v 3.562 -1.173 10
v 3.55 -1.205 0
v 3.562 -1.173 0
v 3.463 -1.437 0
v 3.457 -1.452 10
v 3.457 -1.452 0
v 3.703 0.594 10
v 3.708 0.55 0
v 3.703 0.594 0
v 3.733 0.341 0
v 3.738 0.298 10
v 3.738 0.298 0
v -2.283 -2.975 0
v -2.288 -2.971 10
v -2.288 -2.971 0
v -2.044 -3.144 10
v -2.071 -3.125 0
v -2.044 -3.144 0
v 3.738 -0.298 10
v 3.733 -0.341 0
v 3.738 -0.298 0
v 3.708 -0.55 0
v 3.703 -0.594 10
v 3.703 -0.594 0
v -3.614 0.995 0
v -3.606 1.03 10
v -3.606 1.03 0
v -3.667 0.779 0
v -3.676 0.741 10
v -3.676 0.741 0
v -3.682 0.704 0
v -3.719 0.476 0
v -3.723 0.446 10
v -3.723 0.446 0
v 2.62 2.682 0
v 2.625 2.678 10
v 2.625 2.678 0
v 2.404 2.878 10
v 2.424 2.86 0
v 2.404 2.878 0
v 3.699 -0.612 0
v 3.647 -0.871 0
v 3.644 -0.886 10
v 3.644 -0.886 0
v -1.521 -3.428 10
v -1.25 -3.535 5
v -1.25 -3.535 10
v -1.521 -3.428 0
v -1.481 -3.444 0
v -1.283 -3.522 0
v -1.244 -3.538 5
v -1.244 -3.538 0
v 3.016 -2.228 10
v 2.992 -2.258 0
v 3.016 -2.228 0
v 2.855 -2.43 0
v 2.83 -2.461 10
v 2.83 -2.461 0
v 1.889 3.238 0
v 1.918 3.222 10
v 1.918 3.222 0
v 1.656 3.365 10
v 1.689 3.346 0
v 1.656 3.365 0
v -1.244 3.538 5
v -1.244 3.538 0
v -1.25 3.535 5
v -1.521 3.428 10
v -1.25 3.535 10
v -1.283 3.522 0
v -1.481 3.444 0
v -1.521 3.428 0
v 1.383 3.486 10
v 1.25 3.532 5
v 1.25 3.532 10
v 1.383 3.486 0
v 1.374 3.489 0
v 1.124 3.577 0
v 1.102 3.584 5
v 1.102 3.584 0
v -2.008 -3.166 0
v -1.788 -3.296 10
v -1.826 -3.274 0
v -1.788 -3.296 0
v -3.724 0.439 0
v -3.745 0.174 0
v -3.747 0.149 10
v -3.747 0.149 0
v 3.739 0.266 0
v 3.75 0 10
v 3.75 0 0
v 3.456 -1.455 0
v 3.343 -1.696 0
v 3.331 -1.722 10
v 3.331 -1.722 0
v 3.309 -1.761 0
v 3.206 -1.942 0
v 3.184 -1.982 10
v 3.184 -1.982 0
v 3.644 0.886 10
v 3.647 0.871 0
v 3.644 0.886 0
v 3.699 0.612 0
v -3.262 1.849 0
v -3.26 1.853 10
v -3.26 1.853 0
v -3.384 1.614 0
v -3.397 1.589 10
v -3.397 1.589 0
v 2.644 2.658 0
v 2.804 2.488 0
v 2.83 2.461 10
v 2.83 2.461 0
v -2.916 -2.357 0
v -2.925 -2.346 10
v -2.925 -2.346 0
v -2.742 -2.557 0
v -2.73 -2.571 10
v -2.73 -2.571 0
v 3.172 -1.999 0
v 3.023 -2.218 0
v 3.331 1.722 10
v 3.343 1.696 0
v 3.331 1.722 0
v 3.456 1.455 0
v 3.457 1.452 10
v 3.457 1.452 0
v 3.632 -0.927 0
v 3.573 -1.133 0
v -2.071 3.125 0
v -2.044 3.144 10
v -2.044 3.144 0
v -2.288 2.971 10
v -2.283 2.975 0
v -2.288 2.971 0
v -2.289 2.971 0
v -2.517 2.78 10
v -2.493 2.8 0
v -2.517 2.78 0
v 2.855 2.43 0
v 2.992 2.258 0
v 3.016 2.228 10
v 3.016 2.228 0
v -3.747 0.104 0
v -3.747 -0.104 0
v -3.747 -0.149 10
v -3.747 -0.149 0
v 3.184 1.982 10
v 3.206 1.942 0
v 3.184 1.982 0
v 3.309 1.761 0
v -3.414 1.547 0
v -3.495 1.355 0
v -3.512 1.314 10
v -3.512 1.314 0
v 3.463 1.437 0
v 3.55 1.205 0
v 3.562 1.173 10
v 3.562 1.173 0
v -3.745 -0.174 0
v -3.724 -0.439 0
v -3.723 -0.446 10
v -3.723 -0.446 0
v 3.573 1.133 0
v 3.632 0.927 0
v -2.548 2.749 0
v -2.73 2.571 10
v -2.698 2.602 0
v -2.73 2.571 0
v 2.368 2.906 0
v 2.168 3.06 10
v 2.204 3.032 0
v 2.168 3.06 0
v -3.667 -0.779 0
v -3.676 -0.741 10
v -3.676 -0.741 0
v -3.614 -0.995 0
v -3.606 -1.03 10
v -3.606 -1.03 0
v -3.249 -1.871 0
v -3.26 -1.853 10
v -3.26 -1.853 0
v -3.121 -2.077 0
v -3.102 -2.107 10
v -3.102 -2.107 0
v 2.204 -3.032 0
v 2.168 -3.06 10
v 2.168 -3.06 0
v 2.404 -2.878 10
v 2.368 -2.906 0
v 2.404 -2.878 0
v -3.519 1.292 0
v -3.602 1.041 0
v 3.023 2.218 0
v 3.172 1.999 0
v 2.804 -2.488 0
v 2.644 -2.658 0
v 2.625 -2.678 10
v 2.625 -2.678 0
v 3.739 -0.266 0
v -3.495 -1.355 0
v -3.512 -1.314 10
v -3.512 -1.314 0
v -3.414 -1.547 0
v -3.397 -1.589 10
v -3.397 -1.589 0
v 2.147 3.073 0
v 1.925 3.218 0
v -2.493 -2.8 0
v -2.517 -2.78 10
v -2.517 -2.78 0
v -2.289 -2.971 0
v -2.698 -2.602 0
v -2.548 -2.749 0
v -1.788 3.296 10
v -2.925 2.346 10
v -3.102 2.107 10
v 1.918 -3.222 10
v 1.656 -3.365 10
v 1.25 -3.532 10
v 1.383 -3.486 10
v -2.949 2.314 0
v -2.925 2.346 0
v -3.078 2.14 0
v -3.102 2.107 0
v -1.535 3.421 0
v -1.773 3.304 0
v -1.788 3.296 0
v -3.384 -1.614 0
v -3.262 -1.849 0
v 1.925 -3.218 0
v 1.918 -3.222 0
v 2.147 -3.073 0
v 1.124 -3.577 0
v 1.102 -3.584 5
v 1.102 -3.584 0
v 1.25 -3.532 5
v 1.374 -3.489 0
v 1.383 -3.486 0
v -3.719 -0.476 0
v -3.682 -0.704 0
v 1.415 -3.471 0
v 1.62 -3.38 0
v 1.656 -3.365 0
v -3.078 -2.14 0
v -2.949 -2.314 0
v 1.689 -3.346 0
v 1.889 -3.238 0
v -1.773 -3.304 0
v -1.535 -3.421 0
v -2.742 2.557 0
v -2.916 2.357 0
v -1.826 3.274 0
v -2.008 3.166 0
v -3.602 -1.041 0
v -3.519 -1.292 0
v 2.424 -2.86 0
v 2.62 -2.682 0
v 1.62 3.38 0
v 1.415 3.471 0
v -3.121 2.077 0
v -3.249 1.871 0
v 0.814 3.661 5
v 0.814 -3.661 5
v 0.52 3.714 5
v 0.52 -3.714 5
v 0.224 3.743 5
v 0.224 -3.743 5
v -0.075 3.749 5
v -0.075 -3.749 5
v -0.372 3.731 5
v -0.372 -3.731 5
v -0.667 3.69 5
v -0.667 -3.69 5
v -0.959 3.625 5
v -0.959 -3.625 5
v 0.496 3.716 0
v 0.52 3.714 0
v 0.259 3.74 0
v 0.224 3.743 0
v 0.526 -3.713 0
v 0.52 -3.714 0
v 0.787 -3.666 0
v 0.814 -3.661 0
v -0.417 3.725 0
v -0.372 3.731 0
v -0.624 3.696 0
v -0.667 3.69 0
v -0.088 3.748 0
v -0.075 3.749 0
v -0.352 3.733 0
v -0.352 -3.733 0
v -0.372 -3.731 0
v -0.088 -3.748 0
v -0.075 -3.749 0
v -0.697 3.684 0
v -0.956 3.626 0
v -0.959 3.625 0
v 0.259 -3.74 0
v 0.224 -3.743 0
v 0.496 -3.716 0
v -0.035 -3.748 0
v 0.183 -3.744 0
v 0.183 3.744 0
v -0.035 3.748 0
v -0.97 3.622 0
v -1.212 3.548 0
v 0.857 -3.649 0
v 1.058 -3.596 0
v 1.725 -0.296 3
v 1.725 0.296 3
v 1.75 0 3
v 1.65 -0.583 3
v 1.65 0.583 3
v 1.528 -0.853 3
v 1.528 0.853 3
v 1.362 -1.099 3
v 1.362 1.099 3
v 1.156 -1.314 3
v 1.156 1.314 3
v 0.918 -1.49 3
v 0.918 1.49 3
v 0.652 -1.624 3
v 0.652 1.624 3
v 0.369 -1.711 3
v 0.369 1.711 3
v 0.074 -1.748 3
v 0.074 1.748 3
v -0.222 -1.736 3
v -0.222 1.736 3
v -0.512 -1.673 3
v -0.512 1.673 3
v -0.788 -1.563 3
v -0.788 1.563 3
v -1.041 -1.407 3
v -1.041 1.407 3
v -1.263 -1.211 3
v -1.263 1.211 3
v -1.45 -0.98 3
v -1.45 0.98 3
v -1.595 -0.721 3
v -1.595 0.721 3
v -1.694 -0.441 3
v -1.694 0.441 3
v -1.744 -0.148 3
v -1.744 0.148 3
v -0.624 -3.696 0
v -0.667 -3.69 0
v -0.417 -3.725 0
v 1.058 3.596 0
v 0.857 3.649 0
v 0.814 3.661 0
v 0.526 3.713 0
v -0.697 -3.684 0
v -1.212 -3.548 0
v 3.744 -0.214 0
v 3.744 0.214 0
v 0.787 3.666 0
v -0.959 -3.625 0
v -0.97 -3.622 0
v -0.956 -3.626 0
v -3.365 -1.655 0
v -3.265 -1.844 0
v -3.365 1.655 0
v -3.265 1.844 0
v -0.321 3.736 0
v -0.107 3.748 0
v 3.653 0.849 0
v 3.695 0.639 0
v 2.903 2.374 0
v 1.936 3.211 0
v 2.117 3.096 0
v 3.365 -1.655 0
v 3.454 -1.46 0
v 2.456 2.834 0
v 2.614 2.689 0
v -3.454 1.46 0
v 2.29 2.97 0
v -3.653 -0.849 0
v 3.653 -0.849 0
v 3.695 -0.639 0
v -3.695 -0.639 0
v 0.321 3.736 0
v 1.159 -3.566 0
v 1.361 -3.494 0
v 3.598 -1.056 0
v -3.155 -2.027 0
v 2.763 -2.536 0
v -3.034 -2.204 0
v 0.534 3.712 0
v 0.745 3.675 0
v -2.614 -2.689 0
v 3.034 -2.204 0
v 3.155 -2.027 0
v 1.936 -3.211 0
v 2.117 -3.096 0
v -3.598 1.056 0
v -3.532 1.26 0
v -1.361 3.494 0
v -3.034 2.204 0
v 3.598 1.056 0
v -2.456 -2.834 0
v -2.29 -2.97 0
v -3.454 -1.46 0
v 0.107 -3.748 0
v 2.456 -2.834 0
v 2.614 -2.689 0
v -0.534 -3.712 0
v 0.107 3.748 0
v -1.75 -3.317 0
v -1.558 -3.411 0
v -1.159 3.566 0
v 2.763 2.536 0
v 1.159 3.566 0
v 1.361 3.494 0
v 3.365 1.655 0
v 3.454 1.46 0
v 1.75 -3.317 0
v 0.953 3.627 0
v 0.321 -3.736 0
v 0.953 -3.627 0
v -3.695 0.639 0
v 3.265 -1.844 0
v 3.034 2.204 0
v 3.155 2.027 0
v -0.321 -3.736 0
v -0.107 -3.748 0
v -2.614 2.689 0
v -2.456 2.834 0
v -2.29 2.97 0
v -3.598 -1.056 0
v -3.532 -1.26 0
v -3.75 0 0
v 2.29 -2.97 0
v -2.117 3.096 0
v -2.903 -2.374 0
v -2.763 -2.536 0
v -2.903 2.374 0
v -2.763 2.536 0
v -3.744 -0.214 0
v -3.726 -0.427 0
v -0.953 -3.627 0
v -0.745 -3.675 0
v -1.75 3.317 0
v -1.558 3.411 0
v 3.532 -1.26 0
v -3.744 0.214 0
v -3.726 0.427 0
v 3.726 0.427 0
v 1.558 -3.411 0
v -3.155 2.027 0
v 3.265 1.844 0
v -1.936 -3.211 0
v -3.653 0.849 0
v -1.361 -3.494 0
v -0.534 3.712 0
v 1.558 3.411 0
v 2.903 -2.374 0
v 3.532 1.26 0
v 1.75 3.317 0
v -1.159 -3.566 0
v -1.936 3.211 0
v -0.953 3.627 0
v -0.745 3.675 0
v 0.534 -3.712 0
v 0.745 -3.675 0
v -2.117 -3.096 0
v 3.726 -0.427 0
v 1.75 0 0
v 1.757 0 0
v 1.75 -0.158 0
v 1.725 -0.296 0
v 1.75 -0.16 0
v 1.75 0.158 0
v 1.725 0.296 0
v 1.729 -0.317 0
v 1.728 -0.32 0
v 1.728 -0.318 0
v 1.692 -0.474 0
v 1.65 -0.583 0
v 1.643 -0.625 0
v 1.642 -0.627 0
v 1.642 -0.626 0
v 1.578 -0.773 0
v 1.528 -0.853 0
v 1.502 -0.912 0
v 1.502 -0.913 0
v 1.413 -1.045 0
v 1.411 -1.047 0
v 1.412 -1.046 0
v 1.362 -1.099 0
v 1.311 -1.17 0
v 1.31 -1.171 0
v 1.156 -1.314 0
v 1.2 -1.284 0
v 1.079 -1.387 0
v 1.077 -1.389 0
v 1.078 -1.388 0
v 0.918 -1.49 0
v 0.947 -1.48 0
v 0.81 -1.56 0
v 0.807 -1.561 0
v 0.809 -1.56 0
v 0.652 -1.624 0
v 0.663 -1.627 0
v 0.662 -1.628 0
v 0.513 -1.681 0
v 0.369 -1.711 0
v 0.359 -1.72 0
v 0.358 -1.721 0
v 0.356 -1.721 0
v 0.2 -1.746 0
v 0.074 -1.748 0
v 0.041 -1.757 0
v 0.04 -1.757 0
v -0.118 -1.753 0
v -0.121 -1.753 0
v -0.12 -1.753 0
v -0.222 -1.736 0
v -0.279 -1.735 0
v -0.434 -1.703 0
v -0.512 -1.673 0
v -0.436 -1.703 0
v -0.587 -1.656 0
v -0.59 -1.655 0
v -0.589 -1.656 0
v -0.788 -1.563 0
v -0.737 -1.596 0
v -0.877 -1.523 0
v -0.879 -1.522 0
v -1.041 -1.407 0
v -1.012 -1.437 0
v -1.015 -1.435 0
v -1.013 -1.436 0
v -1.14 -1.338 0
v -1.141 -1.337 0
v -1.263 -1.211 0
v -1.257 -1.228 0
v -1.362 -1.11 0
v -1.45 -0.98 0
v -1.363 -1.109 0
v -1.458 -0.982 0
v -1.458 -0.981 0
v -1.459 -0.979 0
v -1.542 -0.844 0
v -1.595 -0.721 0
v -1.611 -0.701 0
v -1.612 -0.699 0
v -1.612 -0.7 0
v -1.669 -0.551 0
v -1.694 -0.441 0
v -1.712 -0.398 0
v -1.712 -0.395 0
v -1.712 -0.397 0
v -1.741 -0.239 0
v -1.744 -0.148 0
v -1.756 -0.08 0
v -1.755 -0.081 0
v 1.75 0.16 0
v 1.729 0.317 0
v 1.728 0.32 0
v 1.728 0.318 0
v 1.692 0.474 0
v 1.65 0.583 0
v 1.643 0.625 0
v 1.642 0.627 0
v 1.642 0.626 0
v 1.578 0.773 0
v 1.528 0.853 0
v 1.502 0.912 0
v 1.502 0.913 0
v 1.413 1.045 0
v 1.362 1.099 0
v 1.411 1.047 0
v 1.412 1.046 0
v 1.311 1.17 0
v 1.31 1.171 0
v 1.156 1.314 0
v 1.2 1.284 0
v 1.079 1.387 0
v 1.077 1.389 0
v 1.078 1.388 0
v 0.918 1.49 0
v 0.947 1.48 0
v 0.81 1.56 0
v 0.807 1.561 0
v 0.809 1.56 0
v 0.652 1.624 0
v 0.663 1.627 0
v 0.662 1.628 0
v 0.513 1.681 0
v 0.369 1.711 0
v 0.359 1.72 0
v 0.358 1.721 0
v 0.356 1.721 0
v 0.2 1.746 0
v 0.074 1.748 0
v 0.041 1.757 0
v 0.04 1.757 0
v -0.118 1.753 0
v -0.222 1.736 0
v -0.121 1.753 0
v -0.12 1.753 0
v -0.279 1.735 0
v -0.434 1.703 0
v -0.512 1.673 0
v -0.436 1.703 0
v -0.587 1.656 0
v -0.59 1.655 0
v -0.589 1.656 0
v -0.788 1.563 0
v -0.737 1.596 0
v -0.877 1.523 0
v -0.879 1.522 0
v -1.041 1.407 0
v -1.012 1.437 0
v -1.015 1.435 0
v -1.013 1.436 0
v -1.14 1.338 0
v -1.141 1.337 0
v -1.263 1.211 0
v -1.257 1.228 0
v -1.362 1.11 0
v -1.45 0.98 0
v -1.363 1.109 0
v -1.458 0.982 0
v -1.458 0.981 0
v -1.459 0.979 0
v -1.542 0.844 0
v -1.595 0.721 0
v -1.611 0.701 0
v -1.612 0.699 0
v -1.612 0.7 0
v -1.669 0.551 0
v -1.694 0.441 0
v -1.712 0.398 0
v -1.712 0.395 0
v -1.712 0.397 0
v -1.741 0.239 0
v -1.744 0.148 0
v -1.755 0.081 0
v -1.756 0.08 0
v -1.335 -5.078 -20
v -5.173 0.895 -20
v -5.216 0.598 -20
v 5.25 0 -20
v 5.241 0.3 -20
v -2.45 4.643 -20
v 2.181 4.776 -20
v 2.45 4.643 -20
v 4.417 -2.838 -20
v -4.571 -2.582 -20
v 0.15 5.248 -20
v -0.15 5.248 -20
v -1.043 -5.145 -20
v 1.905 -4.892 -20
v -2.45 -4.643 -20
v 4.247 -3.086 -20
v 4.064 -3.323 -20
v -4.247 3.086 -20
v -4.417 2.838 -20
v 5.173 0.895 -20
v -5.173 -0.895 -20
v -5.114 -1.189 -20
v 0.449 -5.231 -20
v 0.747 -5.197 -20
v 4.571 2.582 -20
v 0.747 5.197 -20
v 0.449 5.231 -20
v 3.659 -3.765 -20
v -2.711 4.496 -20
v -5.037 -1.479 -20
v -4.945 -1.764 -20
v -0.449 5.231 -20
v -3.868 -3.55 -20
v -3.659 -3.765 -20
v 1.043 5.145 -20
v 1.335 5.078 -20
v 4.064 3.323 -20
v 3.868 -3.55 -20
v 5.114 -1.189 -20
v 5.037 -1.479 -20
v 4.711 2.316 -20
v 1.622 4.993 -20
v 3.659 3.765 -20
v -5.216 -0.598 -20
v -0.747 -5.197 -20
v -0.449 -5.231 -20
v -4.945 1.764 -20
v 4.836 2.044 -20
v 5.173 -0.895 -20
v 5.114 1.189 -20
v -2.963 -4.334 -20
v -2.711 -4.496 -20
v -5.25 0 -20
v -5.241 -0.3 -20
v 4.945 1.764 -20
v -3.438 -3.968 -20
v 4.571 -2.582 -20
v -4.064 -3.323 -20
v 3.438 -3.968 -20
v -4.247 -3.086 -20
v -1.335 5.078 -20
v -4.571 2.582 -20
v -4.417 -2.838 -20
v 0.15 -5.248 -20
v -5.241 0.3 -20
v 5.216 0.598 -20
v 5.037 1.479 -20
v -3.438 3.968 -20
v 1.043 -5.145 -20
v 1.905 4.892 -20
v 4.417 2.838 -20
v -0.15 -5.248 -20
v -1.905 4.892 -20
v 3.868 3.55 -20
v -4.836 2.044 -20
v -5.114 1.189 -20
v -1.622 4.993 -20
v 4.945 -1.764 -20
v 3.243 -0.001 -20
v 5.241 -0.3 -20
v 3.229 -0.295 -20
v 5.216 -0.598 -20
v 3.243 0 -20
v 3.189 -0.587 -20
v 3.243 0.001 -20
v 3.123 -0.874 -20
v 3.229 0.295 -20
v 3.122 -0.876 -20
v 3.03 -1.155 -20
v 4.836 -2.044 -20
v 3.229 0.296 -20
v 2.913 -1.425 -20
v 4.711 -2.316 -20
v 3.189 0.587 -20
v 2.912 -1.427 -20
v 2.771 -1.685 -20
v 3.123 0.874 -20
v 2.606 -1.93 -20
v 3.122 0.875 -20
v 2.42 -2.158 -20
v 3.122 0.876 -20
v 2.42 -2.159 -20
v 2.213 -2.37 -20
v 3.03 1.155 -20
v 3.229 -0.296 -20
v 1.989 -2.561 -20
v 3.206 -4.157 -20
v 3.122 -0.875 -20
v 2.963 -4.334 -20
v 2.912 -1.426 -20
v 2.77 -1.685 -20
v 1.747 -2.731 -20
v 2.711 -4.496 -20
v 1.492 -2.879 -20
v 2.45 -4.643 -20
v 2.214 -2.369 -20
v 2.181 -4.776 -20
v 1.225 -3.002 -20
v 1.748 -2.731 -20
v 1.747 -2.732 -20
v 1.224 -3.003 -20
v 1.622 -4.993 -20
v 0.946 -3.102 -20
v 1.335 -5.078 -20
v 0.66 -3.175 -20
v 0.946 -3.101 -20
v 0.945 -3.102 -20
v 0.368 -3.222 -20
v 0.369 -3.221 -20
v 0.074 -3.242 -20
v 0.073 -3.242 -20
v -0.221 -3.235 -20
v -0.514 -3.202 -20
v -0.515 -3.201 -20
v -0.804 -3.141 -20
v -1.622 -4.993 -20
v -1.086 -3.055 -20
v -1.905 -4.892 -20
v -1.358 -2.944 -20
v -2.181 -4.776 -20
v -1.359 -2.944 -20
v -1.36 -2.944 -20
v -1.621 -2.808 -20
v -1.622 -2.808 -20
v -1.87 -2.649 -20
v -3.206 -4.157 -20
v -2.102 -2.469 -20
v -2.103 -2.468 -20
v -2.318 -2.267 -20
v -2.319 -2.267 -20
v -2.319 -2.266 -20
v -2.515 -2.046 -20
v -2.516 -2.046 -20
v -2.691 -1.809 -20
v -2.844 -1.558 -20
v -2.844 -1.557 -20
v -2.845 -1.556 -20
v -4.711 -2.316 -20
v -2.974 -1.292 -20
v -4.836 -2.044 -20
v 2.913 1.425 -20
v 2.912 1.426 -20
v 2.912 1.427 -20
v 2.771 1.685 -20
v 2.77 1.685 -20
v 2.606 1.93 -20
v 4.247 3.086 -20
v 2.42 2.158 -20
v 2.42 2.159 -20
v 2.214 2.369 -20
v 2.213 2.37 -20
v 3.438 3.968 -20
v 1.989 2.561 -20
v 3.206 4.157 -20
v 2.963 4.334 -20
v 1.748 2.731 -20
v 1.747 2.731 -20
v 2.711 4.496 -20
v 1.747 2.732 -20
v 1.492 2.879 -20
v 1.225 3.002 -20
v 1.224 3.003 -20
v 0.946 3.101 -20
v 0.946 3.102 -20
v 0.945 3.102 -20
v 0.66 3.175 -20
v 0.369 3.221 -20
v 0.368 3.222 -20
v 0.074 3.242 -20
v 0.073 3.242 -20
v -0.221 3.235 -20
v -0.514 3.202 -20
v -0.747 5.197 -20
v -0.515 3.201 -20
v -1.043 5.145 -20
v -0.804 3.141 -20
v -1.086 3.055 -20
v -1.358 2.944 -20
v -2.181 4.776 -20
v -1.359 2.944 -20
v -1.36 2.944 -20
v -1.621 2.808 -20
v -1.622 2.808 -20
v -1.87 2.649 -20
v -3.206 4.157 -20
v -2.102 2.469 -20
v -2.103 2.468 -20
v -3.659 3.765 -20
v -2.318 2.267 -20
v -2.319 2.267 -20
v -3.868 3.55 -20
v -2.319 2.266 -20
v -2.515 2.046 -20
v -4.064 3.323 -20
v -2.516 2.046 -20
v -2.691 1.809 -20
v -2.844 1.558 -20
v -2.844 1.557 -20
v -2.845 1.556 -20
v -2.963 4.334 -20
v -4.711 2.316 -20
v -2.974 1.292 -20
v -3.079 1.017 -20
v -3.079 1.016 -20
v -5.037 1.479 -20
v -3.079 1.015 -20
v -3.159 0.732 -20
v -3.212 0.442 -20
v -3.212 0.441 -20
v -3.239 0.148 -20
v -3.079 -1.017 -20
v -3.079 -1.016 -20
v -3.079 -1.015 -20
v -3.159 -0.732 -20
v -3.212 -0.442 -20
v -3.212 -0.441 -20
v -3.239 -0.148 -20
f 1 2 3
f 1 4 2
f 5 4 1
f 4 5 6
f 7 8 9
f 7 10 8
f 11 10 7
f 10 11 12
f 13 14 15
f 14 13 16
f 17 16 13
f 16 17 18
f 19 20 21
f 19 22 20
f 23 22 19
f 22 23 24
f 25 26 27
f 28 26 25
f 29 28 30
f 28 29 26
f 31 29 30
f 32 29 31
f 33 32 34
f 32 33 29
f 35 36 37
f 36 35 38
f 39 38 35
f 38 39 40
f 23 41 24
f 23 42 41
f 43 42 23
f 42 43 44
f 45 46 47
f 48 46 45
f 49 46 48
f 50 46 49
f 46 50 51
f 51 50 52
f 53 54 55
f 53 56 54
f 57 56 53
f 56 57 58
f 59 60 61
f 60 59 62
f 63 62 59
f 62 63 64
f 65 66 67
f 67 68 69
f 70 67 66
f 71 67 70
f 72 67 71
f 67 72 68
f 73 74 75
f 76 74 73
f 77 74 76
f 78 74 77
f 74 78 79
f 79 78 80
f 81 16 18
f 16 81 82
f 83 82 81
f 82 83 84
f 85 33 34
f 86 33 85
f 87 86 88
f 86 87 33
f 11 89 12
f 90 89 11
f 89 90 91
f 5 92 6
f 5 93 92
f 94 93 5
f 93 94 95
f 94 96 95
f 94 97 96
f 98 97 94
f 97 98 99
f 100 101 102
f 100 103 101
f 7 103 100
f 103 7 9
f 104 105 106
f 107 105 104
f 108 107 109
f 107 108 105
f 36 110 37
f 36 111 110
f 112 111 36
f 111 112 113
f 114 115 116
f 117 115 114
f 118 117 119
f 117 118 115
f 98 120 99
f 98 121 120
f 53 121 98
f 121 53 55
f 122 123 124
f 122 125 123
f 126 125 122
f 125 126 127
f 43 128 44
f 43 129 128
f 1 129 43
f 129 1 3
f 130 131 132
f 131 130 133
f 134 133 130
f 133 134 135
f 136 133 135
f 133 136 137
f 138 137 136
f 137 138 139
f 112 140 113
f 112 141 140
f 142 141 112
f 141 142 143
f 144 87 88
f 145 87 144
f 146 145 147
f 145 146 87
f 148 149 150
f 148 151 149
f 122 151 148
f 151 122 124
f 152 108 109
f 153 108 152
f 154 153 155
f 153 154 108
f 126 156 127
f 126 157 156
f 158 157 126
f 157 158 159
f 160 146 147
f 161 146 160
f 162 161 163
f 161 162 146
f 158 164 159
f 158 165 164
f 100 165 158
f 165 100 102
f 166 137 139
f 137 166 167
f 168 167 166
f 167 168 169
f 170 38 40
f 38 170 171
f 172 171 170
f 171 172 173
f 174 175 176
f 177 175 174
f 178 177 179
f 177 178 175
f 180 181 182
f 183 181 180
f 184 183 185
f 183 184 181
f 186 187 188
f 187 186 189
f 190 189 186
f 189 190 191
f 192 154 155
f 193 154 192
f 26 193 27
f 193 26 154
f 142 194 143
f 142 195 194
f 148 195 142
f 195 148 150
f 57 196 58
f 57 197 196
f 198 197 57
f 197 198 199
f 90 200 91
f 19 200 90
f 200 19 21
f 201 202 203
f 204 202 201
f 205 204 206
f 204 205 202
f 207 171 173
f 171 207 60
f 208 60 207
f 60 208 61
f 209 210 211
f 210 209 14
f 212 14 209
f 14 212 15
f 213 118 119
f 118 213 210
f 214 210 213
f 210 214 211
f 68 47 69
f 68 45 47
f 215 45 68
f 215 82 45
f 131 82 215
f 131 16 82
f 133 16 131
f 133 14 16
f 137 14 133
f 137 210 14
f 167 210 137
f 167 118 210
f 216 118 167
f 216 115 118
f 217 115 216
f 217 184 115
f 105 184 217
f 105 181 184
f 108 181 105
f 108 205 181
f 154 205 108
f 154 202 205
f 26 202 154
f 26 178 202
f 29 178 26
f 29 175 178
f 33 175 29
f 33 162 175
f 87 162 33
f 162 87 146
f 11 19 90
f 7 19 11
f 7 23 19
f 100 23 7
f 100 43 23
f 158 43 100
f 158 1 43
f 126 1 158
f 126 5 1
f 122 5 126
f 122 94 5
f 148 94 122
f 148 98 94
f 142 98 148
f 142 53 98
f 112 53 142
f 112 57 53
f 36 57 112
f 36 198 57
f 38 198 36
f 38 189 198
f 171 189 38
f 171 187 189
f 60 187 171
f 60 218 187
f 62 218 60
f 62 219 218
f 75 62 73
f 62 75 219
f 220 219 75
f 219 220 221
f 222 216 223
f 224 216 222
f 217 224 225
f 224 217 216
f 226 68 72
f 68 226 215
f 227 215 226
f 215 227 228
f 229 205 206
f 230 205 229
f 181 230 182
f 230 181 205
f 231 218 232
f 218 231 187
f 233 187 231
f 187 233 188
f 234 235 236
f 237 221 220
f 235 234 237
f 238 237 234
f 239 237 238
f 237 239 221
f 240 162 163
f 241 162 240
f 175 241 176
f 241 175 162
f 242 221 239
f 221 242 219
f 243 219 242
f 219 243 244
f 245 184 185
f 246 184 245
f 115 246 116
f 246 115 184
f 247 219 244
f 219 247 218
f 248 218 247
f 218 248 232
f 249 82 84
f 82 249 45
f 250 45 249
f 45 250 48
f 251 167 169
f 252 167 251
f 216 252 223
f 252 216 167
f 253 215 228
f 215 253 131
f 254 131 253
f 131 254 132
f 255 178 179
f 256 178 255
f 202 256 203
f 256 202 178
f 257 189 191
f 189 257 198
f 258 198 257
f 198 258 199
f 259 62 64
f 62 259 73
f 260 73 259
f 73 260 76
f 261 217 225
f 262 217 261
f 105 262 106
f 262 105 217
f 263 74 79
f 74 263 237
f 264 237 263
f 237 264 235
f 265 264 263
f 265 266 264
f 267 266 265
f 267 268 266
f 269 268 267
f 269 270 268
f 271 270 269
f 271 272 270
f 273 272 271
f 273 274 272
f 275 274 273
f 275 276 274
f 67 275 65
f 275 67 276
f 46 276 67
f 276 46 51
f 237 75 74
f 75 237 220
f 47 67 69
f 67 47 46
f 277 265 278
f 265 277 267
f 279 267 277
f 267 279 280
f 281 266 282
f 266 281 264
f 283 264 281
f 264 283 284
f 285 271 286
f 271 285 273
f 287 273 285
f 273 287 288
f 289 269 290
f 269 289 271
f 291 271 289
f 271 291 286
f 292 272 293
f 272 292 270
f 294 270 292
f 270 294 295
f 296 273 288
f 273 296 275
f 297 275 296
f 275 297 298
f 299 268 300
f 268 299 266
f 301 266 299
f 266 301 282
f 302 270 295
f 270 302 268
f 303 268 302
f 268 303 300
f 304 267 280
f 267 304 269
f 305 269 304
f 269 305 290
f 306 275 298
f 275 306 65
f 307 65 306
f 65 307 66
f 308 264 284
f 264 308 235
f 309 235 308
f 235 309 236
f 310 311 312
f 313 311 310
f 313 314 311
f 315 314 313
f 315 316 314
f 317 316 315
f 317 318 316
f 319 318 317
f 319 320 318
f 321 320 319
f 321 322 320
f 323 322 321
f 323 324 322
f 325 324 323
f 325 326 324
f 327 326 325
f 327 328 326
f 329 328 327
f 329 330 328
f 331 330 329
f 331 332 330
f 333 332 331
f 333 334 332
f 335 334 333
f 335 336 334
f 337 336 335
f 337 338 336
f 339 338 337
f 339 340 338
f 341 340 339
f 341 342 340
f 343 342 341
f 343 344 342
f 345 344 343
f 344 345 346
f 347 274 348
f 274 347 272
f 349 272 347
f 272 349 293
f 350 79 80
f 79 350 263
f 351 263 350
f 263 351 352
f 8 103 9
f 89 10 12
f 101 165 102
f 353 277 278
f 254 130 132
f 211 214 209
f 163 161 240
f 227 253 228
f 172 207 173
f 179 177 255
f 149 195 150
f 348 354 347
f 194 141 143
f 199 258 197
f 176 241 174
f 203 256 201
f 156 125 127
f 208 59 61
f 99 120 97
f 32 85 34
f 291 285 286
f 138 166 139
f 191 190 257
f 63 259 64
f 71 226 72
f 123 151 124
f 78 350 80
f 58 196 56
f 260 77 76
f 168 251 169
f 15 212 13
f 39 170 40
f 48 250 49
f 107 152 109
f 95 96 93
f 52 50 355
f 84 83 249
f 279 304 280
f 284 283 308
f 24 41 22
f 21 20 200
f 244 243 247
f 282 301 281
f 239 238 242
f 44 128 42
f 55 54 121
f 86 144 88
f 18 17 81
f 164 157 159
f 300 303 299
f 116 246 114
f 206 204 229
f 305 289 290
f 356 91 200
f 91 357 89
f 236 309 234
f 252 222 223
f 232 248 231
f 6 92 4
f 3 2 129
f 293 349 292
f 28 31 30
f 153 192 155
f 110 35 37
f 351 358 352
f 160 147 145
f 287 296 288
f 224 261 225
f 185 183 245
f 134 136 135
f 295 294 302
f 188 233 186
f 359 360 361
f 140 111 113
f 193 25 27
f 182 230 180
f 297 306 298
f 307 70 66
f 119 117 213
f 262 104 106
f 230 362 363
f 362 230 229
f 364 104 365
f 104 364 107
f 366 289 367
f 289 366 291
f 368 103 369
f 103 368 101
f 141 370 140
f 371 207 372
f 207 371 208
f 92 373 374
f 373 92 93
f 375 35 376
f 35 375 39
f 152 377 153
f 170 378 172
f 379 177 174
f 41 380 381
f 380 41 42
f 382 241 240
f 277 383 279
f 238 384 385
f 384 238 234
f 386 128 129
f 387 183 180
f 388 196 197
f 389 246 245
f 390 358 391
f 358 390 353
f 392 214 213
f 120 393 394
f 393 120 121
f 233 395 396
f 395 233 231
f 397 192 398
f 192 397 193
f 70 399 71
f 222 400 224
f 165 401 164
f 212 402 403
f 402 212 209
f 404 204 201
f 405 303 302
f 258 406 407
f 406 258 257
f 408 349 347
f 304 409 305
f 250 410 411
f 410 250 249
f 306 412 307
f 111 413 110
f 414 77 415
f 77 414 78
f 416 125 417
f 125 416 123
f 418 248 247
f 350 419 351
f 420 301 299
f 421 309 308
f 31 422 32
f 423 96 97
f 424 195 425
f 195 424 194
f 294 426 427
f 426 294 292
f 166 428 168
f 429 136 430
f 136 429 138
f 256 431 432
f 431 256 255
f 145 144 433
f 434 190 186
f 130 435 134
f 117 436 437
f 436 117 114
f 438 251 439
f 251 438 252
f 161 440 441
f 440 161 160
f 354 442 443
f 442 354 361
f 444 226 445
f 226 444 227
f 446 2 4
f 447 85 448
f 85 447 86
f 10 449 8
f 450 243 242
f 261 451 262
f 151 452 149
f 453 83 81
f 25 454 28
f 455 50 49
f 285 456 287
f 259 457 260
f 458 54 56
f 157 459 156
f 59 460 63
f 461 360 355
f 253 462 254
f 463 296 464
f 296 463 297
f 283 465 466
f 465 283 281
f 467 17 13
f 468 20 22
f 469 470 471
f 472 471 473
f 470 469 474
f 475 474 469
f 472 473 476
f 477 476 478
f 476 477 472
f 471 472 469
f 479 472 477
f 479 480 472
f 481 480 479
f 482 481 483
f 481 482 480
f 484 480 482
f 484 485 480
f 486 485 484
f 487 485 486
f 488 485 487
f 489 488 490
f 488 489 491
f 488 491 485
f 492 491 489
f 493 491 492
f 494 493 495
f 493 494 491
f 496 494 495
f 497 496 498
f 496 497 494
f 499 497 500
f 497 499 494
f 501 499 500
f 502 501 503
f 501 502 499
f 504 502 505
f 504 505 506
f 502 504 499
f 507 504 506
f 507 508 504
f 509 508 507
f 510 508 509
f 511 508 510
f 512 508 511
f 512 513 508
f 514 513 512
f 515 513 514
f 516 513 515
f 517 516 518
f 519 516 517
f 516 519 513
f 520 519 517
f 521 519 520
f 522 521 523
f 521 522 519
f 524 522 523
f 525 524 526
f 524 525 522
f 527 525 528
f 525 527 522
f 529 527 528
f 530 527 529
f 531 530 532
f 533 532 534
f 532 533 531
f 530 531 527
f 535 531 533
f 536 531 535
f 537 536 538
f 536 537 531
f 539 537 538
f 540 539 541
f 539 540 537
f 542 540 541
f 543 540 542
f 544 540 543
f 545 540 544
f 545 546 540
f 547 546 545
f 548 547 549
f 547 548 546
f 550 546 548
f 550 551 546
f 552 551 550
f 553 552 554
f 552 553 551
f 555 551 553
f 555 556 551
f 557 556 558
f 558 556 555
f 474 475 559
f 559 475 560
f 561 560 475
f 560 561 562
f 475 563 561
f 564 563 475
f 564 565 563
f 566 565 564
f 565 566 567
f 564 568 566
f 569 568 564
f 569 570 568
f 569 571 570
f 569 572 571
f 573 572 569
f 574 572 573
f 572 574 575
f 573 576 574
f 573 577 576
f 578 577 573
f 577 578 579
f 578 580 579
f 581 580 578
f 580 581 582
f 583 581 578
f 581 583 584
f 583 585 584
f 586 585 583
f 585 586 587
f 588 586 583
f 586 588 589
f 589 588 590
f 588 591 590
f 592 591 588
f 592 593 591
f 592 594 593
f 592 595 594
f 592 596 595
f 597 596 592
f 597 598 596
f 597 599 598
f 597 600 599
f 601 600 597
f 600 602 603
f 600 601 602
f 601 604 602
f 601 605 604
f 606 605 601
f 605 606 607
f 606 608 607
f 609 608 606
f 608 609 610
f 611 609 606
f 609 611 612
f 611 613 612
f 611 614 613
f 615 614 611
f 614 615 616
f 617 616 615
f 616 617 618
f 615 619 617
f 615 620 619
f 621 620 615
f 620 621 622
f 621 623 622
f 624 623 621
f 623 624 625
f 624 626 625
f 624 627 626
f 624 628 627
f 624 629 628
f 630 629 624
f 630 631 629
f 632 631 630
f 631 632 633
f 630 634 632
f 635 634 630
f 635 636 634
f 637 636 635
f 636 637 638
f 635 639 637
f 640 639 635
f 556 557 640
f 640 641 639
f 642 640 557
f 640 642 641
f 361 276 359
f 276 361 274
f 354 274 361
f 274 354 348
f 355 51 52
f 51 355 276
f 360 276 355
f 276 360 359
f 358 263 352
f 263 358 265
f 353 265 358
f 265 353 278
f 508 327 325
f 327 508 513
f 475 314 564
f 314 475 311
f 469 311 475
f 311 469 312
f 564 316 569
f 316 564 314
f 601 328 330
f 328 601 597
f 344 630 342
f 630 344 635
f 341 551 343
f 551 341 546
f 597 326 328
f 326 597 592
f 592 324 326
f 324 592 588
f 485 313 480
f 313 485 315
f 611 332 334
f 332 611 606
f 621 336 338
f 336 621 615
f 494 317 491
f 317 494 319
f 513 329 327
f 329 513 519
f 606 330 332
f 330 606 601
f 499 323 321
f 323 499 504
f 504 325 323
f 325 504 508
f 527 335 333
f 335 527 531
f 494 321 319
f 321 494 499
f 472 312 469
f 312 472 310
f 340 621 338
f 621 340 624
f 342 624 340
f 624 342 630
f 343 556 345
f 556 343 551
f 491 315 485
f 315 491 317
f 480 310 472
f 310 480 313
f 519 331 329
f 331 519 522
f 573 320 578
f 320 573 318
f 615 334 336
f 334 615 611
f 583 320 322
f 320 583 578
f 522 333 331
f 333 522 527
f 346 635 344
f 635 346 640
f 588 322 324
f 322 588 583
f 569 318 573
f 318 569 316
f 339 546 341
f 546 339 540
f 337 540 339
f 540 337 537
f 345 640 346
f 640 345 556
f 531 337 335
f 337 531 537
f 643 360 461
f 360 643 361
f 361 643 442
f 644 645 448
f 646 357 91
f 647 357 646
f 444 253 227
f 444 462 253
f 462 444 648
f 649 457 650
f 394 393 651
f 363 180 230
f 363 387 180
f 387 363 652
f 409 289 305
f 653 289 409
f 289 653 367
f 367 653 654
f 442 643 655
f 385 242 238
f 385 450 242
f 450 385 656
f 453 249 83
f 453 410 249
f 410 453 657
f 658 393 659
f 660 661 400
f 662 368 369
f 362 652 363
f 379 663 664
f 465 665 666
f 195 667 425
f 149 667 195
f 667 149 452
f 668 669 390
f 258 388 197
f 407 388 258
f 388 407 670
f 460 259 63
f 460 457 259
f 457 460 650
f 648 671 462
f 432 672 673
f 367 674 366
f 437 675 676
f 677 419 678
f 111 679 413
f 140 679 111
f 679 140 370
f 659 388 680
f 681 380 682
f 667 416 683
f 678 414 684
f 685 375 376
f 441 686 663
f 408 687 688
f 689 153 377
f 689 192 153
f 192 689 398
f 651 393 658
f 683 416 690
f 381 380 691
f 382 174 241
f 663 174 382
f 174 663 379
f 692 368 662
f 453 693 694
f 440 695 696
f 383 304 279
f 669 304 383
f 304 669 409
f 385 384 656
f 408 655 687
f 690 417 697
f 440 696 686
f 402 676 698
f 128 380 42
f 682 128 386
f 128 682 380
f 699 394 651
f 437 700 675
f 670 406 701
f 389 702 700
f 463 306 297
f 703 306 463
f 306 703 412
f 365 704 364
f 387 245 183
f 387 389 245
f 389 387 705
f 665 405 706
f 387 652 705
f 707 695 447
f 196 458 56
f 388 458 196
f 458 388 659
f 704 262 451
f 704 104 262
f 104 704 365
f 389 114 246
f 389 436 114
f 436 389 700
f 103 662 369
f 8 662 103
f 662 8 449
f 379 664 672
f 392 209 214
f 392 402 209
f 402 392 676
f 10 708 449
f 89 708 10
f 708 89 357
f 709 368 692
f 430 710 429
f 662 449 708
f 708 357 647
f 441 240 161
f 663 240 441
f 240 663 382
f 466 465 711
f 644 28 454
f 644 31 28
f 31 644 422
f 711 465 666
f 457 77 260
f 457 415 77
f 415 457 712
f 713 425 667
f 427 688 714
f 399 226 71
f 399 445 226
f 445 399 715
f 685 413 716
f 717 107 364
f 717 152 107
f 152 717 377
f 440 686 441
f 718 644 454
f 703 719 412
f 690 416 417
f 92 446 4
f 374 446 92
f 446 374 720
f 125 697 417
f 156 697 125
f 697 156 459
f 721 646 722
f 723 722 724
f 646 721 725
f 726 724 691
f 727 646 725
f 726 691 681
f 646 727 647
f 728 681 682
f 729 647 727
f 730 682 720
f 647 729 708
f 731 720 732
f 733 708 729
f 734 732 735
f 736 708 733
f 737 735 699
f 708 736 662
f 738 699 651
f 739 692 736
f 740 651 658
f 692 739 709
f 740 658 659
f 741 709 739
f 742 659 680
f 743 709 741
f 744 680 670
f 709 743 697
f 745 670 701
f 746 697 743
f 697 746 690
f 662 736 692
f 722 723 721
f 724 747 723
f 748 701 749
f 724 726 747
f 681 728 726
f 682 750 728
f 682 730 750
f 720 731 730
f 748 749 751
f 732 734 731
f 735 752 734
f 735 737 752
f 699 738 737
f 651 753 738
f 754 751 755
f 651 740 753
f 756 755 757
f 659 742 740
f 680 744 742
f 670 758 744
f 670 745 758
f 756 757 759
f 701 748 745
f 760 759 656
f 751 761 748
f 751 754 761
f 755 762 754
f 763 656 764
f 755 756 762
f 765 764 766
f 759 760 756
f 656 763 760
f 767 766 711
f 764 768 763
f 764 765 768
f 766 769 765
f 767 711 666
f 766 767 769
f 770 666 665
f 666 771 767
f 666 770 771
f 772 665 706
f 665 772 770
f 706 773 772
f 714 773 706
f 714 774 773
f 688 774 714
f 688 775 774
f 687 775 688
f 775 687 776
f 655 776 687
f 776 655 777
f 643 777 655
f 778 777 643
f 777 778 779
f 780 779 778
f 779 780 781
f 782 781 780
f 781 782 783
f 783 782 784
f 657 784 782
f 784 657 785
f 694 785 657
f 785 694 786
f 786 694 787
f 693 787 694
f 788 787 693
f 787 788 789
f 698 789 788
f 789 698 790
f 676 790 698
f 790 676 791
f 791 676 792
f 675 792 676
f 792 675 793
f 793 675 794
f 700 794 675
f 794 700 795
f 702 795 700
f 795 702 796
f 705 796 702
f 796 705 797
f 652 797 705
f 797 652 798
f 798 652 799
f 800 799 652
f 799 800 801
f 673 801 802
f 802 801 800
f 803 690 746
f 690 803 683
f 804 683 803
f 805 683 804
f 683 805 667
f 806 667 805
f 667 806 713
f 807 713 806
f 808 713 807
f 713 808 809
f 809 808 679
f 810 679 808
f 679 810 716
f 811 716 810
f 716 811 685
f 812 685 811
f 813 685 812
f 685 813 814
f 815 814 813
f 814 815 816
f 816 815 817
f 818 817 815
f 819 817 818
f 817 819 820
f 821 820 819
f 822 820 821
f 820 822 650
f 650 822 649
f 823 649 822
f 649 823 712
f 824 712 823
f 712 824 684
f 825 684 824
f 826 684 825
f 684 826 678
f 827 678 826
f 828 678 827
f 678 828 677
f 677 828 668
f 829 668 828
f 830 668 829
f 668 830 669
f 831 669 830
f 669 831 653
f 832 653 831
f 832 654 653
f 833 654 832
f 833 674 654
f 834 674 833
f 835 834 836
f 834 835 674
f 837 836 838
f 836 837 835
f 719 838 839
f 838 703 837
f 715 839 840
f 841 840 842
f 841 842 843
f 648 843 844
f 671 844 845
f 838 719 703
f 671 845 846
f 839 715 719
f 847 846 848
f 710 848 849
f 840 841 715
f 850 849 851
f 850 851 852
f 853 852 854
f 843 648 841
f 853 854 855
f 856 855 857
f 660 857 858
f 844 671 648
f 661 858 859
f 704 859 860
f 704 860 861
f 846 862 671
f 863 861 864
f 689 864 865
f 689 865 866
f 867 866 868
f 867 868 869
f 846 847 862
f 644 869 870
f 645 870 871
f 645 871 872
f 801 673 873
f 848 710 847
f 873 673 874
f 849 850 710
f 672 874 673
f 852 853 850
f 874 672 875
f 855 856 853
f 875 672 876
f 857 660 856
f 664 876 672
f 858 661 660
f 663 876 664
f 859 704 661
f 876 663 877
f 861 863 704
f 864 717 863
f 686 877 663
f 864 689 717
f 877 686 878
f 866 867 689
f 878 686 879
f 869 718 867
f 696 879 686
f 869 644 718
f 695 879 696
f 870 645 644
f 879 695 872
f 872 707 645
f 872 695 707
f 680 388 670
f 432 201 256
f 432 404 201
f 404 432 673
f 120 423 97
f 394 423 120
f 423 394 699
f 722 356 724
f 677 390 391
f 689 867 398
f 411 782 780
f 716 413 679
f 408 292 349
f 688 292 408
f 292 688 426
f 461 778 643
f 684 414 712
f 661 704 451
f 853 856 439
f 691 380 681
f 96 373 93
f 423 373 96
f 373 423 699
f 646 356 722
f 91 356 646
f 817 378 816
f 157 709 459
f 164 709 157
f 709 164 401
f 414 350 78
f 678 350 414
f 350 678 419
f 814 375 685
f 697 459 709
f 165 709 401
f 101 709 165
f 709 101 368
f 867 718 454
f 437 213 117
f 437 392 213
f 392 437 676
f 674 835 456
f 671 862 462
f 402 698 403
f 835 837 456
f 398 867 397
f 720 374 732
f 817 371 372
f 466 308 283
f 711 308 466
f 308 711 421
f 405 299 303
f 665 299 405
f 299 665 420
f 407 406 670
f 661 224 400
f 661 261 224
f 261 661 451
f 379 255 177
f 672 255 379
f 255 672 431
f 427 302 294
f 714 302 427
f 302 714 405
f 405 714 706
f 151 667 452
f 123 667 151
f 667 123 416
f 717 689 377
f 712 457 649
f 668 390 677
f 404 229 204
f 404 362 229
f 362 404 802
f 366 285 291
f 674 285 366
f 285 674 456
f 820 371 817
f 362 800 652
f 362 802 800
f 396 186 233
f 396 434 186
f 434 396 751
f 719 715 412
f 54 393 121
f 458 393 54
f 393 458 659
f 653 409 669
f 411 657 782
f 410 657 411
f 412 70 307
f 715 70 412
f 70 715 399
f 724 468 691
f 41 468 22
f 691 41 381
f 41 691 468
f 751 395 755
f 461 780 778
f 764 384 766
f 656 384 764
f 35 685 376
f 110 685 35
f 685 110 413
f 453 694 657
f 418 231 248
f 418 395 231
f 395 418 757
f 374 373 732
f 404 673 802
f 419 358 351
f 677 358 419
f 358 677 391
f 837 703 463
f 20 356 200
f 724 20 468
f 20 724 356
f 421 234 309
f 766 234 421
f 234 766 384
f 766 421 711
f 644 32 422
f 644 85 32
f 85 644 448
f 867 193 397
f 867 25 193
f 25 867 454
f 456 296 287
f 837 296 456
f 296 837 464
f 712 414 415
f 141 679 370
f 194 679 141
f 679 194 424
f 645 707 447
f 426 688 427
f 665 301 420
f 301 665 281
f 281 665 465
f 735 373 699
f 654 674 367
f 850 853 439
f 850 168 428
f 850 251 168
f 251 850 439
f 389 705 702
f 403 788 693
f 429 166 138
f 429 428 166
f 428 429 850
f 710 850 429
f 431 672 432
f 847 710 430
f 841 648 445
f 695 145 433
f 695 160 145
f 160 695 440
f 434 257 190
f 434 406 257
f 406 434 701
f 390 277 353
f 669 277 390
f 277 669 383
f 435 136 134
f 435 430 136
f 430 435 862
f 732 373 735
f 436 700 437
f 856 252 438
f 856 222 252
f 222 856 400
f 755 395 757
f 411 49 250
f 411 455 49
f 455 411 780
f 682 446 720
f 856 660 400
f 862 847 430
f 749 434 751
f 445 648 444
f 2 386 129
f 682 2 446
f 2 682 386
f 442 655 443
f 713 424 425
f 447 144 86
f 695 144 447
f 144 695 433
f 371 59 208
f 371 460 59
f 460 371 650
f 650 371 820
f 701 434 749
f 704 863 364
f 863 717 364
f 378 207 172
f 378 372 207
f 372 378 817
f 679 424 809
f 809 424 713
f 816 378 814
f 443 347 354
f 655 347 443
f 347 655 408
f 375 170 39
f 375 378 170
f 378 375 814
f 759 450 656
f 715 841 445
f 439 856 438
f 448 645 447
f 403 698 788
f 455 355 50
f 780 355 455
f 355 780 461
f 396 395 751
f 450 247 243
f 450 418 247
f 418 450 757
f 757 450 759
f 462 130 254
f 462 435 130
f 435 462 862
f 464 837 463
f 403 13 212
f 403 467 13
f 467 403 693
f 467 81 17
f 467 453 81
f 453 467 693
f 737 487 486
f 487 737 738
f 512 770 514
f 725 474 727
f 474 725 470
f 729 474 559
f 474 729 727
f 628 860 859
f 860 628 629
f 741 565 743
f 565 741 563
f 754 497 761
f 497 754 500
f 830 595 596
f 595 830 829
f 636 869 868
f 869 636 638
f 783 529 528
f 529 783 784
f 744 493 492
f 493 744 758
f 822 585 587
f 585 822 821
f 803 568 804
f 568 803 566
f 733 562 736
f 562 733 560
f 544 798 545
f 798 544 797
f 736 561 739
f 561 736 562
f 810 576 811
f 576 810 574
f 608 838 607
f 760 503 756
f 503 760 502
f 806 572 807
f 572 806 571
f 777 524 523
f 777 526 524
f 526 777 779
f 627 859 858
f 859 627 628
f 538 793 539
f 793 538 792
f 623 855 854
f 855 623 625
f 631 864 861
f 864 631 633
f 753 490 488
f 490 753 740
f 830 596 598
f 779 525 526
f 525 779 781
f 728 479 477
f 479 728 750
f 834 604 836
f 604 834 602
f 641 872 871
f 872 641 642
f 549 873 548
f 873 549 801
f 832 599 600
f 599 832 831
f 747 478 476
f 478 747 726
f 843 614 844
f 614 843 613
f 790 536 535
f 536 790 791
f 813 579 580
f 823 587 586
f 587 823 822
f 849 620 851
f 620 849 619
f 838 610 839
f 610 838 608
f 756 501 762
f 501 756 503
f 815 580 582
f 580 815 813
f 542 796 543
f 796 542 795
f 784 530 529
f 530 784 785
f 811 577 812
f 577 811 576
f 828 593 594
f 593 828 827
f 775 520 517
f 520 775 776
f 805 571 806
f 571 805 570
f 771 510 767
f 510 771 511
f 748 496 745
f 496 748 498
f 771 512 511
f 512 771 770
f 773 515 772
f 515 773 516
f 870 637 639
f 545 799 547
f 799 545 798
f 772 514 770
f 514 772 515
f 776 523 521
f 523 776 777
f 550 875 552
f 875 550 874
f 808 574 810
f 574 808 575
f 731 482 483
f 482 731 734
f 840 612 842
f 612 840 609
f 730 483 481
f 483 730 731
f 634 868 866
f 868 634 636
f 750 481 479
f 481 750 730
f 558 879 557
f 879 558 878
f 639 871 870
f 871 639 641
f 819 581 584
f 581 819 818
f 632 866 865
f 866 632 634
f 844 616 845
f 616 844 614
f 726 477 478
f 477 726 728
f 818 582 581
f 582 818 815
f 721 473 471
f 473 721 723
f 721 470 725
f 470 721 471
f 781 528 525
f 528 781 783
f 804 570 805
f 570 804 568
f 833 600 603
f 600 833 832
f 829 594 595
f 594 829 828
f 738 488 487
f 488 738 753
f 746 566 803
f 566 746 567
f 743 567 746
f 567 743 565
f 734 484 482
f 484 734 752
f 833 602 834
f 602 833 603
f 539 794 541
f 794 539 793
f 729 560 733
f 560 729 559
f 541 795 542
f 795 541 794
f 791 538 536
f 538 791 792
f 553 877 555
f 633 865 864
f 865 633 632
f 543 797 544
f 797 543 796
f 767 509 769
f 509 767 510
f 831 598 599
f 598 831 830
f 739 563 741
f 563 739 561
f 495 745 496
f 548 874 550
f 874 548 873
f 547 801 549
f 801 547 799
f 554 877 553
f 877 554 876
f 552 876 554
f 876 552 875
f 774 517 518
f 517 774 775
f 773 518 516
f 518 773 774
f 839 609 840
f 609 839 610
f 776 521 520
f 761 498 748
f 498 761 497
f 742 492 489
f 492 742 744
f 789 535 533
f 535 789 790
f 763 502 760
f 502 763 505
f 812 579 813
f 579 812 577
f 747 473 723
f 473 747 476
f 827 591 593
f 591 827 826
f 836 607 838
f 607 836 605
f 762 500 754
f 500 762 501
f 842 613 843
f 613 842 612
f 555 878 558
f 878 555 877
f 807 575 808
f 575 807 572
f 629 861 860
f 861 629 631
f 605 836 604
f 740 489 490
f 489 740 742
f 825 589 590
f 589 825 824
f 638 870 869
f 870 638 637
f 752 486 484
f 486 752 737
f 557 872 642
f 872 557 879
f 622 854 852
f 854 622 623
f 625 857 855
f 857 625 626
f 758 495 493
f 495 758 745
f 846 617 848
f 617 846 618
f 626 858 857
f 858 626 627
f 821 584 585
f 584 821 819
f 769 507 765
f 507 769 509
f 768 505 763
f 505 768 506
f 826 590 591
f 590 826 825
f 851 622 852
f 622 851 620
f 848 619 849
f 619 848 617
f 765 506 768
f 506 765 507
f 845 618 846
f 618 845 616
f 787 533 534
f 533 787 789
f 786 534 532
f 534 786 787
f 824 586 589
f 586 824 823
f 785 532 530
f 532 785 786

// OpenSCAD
// Oiler nozzle cap with rubber band
// by György Balássy 2016 (http://gyorgybalassy.wordpress.com)
// http://www.thingiverse.com/thing:2014720

// The thickness of the wall in mm.
wallThickness = 2;

// The inner diameter of the top, rubber band holder section (dark blue) in mm.
topDiameter = 3.5;

// The height of the top, rubber band holder section (dark blue) in mm.
topHeight = 5;

// The inner diameter of the central section (dark blue) in mm.
middleDiameter = 3.5;

// The height of the central section (dark blue) in mm.
middleHeight = 3;

// The inner diameter of the bottom section (light blue) in mm.
bottomDiameter = 6.5;

// The height of the bottom section (light blue) in mm.
bottomHeight = 20;

/* [Hidden] */

capHeight = wallThickness;

mainColor = [0.117, 0.565, 1];      // DodgerBlue: RGB(30, 144, 255)
highlightColor = [0.384, 0.726, 1]; // Lighter DodgerBlue: RGB(98, 185, 255)

$fa = 0.3;     // Default minimum facet angle.
$fs = 0.3;     // Default minimum facet size.
delta = 0.1;   // Ensures that no faces remains after boolean operations.

// Top section.
color(mainColor) {
  difference() {
    translate([0, 0, middleHeight + capHeight])
      cylinder(d1 = topDiameter + 2 * wallThickness, d2 = topDiameter + 2 * wallThickness, h = topHeight);
    
    translate([-(topDiameter + 2 * wallThickness) / 3 / 2, -(topDiameter + 2 * wallThickness) / 2, middleHeight + wallThickness - delta])
      cube([(topDiameter + 2 * wallThickness) / 3, topDiameter + 2 * wallThickness + 2 * delta, topHeight + 2 * delta]);
  }
}

// Cap.
color(highlightColor) {  
  translate([0, 0, middleHeight])
    cylinder(d1 = middleDiameter + 2 * wallThickness, d2 = topDiameter + 2 * wallThickness, h = capHeight);
}

// Middle section.
color(mainColor) {
  tube(middleDiameter, topDiameter, wallThickness, middleHeight);
}  

// Bottom section.
color(highlightColor) {
  translate([0, 0, -bottomHeight])
    tube(bottomDiameter, middleDiameter, wallThickness, bottomHeight);
} 

module tube(bottomInnerDiameter, topInnerDiameter, wallThickness, height) {
  difference() {   
    cylinder(d1 = bottomInnerDiameter + 2 * wallThickness, d2 = topInnerDiameter + 2 * wallThickness, h = height);  // Outer
    translate([0, 0, -delta])
      cylinder(d1 = bottomInnerDiameter, d2 = topInnerDiameter, h = height + 2 * delta);  // Inner
  }  
}
